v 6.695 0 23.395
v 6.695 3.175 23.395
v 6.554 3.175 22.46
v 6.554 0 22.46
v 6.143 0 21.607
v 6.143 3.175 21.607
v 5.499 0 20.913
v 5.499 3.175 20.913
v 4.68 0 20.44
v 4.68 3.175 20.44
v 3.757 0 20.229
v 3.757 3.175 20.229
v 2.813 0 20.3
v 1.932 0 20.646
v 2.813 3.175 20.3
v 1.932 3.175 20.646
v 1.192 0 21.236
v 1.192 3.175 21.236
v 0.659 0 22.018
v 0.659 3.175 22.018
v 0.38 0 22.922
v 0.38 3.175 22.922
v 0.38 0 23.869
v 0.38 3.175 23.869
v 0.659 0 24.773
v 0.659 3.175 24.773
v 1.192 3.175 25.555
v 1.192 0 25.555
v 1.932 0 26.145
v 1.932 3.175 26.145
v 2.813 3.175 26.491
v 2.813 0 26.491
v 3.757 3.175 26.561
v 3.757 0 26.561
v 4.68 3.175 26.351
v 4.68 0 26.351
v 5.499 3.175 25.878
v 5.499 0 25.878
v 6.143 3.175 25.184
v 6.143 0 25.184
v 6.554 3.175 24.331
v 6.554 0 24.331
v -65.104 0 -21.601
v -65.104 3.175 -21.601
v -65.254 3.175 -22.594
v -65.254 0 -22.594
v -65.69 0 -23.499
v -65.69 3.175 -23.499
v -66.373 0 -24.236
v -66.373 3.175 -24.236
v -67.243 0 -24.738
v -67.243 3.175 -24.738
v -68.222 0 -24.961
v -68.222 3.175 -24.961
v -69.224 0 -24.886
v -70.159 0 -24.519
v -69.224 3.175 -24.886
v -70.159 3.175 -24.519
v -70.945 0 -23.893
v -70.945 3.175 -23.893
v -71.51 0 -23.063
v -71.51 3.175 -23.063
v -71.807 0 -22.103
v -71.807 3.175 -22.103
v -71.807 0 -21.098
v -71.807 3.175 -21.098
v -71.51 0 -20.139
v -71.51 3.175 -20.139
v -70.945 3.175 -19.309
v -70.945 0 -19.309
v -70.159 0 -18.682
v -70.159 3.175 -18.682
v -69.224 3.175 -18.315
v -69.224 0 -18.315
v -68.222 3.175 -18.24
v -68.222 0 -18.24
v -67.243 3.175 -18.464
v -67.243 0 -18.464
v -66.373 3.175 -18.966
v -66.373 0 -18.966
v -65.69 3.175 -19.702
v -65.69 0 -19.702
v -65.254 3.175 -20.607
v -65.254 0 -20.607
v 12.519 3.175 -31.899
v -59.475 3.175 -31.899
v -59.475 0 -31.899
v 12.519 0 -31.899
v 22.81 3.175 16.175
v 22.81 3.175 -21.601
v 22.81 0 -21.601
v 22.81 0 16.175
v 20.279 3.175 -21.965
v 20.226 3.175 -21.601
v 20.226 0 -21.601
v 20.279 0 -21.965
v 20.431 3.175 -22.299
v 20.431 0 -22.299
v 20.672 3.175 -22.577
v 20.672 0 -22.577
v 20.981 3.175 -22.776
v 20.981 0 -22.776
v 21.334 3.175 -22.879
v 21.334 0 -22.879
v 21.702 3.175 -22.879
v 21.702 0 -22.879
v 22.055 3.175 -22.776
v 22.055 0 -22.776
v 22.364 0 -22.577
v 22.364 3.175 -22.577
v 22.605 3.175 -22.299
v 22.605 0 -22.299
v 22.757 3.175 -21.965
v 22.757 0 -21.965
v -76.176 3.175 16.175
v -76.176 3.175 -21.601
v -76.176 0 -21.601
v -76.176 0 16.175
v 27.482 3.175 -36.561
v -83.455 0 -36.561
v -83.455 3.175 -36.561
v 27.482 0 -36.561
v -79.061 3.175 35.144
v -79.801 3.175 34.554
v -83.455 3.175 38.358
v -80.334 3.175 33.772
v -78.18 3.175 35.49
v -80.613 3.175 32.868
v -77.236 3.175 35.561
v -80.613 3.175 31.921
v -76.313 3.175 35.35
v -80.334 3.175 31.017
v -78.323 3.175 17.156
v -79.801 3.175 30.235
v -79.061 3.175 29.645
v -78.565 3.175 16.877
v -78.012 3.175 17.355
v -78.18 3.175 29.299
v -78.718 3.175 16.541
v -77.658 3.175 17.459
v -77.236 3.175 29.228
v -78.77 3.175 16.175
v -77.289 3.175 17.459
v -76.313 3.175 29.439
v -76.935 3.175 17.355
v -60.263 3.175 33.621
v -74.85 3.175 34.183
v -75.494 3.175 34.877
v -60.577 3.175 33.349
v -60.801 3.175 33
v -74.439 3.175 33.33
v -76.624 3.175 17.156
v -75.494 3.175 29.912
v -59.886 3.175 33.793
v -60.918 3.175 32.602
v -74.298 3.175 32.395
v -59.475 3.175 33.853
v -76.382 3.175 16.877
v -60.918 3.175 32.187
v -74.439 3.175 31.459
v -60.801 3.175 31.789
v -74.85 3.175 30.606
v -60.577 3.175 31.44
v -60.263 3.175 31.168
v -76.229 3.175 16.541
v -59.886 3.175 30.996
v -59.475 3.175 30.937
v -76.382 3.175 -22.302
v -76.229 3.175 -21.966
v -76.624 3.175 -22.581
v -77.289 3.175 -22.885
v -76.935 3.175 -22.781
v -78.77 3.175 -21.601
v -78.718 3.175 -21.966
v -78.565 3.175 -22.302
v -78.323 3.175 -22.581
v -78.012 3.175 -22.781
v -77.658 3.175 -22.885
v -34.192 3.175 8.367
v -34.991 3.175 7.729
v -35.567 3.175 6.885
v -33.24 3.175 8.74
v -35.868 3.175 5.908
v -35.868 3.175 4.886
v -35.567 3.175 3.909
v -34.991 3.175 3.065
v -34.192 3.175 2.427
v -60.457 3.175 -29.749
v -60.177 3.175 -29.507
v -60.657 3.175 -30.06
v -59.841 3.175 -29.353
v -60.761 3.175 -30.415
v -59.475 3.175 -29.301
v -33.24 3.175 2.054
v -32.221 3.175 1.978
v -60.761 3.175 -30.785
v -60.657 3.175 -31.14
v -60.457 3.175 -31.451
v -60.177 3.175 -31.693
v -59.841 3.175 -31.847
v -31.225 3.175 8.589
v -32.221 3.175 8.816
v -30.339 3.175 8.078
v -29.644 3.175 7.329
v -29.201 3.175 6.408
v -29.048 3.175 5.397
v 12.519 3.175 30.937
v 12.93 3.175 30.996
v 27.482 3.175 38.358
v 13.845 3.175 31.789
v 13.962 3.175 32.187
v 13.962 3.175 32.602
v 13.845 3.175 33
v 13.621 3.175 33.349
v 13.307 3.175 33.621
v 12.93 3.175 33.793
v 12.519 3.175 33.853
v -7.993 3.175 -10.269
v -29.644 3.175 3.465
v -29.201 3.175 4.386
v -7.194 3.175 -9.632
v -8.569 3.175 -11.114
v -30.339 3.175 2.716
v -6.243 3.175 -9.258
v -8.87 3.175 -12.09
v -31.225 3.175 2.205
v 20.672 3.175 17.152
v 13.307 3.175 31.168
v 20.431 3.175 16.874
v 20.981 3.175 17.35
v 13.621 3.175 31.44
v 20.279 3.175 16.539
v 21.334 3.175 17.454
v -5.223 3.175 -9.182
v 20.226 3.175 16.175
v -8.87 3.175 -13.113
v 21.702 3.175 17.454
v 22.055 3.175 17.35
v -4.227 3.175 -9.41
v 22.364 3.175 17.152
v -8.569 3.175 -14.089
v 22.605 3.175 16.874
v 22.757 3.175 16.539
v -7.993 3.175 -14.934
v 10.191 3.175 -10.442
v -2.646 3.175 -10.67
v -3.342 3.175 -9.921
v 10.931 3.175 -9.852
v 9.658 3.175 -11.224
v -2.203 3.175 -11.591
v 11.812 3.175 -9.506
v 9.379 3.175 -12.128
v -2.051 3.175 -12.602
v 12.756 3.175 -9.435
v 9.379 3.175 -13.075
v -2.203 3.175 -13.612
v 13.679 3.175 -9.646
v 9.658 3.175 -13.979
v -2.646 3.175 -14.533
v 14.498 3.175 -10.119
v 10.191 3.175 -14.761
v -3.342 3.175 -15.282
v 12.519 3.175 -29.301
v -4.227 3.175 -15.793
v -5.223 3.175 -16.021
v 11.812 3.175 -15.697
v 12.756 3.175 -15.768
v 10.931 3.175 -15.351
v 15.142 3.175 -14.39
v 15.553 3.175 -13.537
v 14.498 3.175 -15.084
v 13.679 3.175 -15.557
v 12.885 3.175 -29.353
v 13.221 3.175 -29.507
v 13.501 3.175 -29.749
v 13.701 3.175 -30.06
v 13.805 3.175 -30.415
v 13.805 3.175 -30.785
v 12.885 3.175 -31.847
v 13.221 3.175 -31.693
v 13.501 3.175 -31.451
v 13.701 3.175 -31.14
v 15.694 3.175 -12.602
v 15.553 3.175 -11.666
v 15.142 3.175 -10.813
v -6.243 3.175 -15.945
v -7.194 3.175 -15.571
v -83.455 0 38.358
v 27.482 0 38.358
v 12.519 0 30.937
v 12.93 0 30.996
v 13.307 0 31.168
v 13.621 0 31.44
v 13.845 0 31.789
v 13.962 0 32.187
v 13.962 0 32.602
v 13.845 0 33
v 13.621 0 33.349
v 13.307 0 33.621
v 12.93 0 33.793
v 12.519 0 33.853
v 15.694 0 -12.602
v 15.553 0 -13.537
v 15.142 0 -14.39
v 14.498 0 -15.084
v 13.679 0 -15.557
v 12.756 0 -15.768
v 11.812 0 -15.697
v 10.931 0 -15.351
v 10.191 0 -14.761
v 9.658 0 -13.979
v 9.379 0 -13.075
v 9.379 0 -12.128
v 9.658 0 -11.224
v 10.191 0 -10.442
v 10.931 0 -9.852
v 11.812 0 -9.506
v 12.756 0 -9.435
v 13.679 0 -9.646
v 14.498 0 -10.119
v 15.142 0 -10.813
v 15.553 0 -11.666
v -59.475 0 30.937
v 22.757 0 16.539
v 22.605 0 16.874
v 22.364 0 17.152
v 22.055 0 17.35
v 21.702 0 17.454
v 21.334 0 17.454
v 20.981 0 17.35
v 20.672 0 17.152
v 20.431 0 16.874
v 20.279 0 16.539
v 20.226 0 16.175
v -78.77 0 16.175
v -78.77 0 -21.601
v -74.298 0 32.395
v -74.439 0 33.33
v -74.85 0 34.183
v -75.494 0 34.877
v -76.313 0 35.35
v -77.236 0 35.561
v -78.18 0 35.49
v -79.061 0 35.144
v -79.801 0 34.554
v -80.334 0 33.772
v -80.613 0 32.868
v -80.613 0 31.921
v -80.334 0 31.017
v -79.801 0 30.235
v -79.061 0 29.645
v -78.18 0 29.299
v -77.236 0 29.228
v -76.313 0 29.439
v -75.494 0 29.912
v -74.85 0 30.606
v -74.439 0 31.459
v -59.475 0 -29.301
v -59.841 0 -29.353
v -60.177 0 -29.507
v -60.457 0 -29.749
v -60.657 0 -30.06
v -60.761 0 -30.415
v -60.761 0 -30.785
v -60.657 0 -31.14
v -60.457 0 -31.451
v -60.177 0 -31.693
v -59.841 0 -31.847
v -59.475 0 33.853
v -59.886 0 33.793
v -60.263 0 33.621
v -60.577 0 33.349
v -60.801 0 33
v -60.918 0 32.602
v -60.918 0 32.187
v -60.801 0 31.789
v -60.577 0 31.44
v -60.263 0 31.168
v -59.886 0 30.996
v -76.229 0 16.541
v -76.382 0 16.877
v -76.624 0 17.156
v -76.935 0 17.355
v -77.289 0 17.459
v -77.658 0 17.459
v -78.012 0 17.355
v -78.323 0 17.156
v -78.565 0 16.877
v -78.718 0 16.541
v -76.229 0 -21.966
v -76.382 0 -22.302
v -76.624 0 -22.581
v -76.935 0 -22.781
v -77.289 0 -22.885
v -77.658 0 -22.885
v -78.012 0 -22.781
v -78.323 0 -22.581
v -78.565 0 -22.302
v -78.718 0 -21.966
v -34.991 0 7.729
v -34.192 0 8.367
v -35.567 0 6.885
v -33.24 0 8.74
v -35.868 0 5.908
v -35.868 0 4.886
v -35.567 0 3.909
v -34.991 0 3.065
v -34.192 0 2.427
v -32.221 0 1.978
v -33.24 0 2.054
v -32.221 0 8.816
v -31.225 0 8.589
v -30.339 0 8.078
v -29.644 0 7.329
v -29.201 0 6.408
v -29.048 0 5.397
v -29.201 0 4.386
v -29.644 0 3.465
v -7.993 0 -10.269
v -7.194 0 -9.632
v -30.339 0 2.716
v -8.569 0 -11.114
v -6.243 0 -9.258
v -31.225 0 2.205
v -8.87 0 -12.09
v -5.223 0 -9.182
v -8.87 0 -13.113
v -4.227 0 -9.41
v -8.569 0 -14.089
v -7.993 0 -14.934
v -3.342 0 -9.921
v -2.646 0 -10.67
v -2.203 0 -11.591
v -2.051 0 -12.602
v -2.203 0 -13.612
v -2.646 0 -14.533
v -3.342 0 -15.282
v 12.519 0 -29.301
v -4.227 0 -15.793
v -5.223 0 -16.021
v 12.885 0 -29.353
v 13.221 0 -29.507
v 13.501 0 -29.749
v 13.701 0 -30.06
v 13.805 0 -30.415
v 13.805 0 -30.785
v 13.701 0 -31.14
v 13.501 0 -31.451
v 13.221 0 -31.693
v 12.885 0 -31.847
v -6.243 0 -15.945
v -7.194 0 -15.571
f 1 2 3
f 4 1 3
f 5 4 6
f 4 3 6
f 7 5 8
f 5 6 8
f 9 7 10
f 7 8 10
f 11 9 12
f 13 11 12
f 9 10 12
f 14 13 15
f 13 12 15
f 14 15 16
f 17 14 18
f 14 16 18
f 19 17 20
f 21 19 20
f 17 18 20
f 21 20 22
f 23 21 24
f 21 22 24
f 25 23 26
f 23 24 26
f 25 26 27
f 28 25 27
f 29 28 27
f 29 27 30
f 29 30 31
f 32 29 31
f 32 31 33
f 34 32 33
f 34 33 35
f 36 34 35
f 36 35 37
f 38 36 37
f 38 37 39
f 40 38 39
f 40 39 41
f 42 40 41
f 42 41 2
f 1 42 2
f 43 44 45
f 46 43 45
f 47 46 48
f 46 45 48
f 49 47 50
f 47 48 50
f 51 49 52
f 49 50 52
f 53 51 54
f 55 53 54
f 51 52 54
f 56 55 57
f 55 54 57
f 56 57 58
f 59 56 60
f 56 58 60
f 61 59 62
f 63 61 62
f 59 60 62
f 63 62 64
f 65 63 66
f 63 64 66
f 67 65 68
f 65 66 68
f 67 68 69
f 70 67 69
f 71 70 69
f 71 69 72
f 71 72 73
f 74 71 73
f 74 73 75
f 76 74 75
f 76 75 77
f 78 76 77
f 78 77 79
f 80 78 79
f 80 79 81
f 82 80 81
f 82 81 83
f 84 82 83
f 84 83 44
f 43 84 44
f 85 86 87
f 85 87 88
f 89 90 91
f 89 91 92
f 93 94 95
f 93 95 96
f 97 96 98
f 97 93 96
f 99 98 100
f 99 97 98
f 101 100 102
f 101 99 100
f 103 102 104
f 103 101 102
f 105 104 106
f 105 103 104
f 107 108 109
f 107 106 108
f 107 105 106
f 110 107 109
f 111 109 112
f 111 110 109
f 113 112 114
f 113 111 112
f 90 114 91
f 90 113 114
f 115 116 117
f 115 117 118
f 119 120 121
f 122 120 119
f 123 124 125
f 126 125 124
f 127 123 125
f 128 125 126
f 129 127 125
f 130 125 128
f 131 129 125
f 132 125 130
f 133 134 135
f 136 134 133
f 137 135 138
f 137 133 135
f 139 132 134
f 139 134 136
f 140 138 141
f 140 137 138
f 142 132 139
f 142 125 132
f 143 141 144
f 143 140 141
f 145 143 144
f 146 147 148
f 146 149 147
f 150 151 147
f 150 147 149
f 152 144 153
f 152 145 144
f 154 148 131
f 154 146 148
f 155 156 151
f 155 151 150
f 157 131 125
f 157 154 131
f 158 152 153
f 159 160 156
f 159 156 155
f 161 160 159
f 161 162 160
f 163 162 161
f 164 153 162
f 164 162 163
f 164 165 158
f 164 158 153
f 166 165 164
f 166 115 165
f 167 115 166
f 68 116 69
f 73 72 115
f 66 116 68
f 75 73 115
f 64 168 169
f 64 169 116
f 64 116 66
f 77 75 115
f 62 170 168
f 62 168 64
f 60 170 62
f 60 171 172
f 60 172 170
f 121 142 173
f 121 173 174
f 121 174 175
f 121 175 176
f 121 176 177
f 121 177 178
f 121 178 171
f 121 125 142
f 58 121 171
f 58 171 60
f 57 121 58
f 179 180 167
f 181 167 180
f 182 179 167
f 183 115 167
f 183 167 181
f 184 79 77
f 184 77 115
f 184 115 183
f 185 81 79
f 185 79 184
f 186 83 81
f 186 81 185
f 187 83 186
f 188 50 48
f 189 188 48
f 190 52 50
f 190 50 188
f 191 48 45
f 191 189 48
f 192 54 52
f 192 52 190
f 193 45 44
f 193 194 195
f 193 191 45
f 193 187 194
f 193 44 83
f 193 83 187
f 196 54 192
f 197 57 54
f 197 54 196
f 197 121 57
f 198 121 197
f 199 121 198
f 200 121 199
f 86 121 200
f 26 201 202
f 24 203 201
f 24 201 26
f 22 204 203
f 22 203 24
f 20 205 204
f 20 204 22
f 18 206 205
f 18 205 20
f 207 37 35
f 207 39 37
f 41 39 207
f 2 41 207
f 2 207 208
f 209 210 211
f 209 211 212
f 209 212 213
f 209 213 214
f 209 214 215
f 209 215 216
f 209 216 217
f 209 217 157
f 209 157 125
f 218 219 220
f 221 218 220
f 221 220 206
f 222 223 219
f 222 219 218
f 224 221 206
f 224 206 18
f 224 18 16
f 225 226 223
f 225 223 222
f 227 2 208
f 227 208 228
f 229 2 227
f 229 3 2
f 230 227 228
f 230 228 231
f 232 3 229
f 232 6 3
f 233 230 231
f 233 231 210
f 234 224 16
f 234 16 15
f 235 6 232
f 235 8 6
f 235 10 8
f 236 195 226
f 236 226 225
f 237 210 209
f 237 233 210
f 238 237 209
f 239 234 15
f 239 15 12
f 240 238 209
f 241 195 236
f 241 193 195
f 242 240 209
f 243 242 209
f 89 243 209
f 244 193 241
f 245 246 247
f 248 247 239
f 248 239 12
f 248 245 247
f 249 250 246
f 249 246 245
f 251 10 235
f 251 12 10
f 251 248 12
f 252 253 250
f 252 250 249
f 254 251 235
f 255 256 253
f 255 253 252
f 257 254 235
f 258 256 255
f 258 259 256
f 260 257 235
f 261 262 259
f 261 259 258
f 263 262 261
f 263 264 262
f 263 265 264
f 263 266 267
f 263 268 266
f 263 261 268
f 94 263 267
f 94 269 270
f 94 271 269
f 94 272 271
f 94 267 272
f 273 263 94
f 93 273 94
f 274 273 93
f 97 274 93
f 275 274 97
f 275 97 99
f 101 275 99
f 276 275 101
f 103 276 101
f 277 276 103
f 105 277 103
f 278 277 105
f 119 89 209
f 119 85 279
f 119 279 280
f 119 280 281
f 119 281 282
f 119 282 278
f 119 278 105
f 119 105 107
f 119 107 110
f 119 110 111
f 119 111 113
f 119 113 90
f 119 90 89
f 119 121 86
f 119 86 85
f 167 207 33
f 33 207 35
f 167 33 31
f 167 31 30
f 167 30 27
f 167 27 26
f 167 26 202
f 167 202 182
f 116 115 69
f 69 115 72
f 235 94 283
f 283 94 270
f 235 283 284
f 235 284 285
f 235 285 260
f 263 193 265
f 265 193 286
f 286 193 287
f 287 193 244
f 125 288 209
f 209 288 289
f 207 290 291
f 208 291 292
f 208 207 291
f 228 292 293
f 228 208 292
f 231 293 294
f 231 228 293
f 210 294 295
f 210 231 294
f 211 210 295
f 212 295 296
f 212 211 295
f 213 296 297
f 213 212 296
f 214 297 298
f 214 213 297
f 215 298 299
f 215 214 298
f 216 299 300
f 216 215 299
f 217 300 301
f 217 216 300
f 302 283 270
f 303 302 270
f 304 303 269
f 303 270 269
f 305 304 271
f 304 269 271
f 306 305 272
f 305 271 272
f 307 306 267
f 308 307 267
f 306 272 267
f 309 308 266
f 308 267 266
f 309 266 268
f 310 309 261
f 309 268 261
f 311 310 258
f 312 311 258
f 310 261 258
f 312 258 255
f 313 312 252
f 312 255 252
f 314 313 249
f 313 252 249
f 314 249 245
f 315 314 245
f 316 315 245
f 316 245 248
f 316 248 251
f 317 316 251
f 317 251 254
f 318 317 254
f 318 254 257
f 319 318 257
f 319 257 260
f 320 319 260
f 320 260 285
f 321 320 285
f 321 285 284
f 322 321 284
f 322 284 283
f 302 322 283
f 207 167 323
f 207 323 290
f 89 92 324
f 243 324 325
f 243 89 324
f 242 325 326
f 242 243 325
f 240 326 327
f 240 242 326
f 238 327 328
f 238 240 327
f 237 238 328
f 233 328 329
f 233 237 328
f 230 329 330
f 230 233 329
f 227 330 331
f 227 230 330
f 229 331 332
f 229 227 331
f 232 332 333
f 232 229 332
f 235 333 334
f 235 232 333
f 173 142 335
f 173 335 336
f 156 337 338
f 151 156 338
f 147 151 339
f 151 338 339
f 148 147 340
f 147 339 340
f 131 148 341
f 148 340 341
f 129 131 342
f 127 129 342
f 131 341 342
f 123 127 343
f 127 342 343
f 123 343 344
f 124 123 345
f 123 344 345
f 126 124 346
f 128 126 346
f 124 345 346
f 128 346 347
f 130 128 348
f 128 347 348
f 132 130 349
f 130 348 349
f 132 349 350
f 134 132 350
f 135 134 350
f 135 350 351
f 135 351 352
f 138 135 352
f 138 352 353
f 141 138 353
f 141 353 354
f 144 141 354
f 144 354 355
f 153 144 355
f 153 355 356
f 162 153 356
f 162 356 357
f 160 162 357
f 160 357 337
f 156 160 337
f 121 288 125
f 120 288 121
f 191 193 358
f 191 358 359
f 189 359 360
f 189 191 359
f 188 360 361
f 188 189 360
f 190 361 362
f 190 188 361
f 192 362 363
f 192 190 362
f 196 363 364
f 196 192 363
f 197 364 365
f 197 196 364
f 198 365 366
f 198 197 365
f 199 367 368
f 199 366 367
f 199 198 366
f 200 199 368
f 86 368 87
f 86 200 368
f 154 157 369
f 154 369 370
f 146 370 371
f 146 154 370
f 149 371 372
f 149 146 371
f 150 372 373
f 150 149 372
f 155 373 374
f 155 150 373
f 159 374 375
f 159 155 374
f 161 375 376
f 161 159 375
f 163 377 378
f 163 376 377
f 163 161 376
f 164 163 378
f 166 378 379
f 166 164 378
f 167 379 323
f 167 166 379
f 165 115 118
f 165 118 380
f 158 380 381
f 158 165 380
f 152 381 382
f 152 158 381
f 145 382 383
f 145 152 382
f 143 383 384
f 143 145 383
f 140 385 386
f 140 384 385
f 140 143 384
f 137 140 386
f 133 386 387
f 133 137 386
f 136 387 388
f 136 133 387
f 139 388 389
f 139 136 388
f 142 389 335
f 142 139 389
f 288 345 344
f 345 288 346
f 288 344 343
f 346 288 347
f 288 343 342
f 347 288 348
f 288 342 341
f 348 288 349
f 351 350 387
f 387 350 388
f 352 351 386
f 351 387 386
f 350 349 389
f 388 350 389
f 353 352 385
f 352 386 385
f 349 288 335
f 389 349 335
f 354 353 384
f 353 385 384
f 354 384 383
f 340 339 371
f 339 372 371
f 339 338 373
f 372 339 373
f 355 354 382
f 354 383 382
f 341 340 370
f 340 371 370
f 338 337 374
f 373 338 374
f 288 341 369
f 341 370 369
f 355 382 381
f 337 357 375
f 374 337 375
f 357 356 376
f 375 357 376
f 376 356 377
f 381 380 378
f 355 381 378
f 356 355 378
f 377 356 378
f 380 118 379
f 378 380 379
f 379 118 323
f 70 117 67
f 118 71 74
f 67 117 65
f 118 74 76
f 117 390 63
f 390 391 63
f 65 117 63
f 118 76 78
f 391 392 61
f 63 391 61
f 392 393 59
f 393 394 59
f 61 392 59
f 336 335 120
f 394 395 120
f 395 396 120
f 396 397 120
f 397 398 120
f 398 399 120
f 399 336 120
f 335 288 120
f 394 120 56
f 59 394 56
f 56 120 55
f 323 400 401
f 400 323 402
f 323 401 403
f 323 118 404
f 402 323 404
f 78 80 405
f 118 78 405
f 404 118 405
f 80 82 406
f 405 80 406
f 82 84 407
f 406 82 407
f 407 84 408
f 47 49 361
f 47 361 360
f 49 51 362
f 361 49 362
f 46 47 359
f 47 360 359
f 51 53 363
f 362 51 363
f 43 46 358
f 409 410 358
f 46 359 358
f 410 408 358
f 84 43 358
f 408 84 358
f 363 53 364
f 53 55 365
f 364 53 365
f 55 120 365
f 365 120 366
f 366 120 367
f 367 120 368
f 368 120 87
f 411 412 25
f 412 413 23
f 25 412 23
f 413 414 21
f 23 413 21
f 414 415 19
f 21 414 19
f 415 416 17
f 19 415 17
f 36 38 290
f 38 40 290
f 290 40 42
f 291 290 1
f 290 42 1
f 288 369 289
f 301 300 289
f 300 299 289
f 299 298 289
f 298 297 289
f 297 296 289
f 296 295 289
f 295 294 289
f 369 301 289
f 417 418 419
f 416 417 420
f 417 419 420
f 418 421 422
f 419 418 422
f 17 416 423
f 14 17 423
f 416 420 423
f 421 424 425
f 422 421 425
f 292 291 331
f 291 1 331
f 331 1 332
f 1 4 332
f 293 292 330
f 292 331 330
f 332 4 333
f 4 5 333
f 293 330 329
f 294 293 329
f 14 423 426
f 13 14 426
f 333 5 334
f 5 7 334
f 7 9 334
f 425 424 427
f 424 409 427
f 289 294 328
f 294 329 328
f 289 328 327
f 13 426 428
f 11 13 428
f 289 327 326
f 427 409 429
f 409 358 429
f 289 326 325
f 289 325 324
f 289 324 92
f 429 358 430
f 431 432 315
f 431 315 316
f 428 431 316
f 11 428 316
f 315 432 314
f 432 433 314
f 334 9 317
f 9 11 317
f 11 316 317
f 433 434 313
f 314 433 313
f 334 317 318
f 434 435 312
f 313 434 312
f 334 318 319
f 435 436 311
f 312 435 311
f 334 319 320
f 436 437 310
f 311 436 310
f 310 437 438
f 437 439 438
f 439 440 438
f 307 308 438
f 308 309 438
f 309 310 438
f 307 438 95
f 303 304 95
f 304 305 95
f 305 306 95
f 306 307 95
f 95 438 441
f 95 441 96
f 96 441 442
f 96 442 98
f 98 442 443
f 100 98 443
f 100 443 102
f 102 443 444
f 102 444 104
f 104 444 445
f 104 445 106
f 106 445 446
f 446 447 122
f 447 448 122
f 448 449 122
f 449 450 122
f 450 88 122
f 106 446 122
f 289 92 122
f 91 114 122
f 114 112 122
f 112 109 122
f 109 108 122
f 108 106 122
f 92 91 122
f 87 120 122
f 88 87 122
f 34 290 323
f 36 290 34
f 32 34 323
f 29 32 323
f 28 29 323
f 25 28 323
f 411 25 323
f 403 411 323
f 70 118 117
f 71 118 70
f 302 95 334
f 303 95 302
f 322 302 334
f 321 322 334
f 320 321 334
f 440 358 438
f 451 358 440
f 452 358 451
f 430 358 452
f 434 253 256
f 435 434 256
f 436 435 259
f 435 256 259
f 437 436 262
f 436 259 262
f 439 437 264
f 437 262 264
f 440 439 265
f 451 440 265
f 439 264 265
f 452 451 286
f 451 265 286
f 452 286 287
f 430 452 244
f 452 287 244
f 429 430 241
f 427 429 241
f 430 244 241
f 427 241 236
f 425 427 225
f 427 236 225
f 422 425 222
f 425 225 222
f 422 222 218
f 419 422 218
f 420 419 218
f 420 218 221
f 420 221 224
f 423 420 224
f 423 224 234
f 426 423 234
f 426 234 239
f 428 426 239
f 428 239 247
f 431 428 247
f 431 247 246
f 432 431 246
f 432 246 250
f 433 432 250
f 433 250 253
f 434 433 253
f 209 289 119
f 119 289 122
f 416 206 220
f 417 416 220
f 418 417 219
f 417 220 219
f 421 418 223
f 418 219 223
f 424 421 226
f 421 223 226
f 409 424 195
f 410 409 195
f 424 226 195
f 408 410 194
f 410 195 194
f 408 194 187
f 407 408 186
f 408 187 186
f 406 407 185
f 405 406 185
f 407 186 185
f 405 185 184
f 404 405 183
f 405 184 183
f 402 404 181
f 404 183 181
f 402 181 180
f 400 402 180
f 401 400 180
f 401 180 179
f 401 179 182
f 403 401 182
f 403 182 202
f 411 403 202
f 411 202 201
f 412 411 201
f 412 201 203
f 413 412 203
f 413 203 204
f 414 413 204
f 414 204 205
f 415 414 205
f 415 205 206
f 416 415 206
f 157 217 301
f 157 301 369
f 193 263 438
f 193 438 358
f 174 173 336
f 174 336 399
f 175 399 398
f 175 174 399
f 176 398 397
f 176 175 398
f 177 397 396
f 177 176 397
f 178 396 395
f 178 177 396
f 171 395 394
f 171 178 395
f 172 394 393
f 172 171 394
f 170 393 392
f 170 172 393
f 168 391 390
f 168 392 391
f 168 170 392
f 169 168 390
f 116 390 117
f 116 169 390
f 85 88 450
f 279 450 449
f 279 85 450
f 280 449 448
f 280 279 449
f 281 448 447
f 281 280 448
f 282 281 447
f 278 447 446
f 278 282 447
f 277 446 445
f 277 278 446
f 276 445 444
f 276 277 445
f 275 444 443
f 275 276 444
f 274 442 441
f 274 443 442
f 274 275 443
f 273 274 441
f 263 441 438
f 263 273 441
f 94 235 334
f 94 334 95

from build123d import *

# Parameters (mm, degrees)
SKETCH1_W           = 110.936328641
SKETCH1_H           = 74.919128642
BOSS_EXTRUDE1_DEPTH = 3.175
SKETCH2_R           = 3.175
CUT_EXTRUDE1_DEPTH  = 4.175
SKETCH10_R          = 3.175
CUT_EXTRUDE5_DEPTH  = 4.175
CUT_EXTRUDE6_DEPTH  = 4.175
SKETCH12_R          = 3.370079304
SKETCH12_R_2        = 3.429
CUT_EXTRUDE7_DEPTH  = 4.175


with BuildPart() as part:
    # Sketch1 → Boss-Extrude1 (new body)
    with BuildSketch(Plane(origin=(0, 0, 0), x_dir=(1, 0, 0), z_dir=(0, 1, 0))):
        with Locations((-27.986559238, -0.898578046)):
            Rectangle(SKETCH1_W, SKETCH1_H)
    extrude(amount=BOSS_EXTRUDE1_DEPTH)

    # Sketch2 → Cut-Extrude1 (cut, through all)
    with BuildSketch(Plane.XZ):
        with Locations((-77.473379238, 32.394578046)):
            Circle(SKETCH2_R)
    extrude(amount=-CUT_EXTRUDE1_DEPTH, mode=Mode.SUBTRACT)

    # Sketch10 → Cut-Extrude5 (cut, through all)
    with BuildSketch(Plane(origin=(0, 3.175, 0), x_dir=(1, 0, 0), z_dir=(0, 1, 0))):
        with Locations((3.519600762, -23.395358046)):
            Circle(SKETCH10_R)
        with Locations((12.518820762, 12.601521954)):
            Circle(SKETCH10_R)
    extrude(amount=-CUT_EXTRUDE5_DEPTH, mode=Mode.SUBTRACT)

    # Sketch11 → Cut-Extrude6 (cut, through all)
    with BuildSketch(Plane(origin=(0, 3.175, 0), x_dir=(1, 0, 0), z_dir=(0, 1, 0))):
        with BuildLine():
            Line((-78.770441311, -16.175423663), (-78.770441311, 21.600741954))
            ThreePointArc((-78.770441311, 21.600741954), (-77.473379238, 22.897804027), (-76.176317164, 21.600741954))
            Line((-76.176317164, 21.600741954), (-76.176317164, -16.175423663))
            ThreePointArc((-76.176317164, -16.175423663), (-77.473379238, -17.472485737), (-78.770441311, -16.175423663))
        make_face()
        with BuildLine():
            Line((-59.474939238, 31.899342378), (12.518820762, 31.899342378))
            ThreePointArc((12.518820762, 31.899342378), (13.818201186, 30.599961954), (12.518820762, 29.30058153))
            Line((12.518820762, 29.30058153), (-59.474939238, 29.30058153))
            ThreePointArc((-59.474939238, 29.30058153), (-60.774319661, 30.599961954), (-59.474939238, 31.899342378))
        make_face()
        with BuildLine():
            Line((12.518820762, -33.852545554), (-59.474939238, -33.852545554))
            ThreePointArc((-59.474939238, -33.852545554), (-60.932906745, -32.394578046), (-59.474939238, -30.936610538))
            Line((-59.474939238, -30.936610538), (12.518820762, -30.936610538))
            ThreePointArc((12.518820762, -30.936610538), (13.97678827, -32.394578046), (12.518820762, -33.852545554))
        make_face()
        with BuildLine():
            Line((20.226413943, -16.175423663), (20.226413943, 21.600741954))
            ThreePointArc((20.226413943, 21.600741954), (21.518040762, 22.892368774), (22.809667582, 21.600741954))
            Line((22.809667582, 21.600741954), (22.809667582, -16.175423663))
            ThreePointArc((22.809667582, -16.175423663), (21.518040762, -17.467050483), (20.226413943, -16.175423663))
        make_face()
    extrude(amount=-CUT_EXTRUDE6_DEPTH, mode=Mode.SUBTRACT)

    # Sketch12 → Cut-Extrude7 (cut, through all)
    with BuildSketch(Plane(origin=(0, 3.175, 0), x_dir=(1, 0, 0), z_dir=(0, 1, 0))):
        with Locations((-68.474159238, 21.600741954)):
            Circle(SKETCH12_R)
        with Locations((-32.477279238, -5.396918046)):
            Circle(SKETCH12_R_2)
        with Locations((-5.479619238, 12.601521954)):
            Circle(SKETCH12_R_2)
    extrude(amount=-CUT_EXTRUDE7_DEPTH, mode=Mode.SUBTRACT)


solid = part.part
